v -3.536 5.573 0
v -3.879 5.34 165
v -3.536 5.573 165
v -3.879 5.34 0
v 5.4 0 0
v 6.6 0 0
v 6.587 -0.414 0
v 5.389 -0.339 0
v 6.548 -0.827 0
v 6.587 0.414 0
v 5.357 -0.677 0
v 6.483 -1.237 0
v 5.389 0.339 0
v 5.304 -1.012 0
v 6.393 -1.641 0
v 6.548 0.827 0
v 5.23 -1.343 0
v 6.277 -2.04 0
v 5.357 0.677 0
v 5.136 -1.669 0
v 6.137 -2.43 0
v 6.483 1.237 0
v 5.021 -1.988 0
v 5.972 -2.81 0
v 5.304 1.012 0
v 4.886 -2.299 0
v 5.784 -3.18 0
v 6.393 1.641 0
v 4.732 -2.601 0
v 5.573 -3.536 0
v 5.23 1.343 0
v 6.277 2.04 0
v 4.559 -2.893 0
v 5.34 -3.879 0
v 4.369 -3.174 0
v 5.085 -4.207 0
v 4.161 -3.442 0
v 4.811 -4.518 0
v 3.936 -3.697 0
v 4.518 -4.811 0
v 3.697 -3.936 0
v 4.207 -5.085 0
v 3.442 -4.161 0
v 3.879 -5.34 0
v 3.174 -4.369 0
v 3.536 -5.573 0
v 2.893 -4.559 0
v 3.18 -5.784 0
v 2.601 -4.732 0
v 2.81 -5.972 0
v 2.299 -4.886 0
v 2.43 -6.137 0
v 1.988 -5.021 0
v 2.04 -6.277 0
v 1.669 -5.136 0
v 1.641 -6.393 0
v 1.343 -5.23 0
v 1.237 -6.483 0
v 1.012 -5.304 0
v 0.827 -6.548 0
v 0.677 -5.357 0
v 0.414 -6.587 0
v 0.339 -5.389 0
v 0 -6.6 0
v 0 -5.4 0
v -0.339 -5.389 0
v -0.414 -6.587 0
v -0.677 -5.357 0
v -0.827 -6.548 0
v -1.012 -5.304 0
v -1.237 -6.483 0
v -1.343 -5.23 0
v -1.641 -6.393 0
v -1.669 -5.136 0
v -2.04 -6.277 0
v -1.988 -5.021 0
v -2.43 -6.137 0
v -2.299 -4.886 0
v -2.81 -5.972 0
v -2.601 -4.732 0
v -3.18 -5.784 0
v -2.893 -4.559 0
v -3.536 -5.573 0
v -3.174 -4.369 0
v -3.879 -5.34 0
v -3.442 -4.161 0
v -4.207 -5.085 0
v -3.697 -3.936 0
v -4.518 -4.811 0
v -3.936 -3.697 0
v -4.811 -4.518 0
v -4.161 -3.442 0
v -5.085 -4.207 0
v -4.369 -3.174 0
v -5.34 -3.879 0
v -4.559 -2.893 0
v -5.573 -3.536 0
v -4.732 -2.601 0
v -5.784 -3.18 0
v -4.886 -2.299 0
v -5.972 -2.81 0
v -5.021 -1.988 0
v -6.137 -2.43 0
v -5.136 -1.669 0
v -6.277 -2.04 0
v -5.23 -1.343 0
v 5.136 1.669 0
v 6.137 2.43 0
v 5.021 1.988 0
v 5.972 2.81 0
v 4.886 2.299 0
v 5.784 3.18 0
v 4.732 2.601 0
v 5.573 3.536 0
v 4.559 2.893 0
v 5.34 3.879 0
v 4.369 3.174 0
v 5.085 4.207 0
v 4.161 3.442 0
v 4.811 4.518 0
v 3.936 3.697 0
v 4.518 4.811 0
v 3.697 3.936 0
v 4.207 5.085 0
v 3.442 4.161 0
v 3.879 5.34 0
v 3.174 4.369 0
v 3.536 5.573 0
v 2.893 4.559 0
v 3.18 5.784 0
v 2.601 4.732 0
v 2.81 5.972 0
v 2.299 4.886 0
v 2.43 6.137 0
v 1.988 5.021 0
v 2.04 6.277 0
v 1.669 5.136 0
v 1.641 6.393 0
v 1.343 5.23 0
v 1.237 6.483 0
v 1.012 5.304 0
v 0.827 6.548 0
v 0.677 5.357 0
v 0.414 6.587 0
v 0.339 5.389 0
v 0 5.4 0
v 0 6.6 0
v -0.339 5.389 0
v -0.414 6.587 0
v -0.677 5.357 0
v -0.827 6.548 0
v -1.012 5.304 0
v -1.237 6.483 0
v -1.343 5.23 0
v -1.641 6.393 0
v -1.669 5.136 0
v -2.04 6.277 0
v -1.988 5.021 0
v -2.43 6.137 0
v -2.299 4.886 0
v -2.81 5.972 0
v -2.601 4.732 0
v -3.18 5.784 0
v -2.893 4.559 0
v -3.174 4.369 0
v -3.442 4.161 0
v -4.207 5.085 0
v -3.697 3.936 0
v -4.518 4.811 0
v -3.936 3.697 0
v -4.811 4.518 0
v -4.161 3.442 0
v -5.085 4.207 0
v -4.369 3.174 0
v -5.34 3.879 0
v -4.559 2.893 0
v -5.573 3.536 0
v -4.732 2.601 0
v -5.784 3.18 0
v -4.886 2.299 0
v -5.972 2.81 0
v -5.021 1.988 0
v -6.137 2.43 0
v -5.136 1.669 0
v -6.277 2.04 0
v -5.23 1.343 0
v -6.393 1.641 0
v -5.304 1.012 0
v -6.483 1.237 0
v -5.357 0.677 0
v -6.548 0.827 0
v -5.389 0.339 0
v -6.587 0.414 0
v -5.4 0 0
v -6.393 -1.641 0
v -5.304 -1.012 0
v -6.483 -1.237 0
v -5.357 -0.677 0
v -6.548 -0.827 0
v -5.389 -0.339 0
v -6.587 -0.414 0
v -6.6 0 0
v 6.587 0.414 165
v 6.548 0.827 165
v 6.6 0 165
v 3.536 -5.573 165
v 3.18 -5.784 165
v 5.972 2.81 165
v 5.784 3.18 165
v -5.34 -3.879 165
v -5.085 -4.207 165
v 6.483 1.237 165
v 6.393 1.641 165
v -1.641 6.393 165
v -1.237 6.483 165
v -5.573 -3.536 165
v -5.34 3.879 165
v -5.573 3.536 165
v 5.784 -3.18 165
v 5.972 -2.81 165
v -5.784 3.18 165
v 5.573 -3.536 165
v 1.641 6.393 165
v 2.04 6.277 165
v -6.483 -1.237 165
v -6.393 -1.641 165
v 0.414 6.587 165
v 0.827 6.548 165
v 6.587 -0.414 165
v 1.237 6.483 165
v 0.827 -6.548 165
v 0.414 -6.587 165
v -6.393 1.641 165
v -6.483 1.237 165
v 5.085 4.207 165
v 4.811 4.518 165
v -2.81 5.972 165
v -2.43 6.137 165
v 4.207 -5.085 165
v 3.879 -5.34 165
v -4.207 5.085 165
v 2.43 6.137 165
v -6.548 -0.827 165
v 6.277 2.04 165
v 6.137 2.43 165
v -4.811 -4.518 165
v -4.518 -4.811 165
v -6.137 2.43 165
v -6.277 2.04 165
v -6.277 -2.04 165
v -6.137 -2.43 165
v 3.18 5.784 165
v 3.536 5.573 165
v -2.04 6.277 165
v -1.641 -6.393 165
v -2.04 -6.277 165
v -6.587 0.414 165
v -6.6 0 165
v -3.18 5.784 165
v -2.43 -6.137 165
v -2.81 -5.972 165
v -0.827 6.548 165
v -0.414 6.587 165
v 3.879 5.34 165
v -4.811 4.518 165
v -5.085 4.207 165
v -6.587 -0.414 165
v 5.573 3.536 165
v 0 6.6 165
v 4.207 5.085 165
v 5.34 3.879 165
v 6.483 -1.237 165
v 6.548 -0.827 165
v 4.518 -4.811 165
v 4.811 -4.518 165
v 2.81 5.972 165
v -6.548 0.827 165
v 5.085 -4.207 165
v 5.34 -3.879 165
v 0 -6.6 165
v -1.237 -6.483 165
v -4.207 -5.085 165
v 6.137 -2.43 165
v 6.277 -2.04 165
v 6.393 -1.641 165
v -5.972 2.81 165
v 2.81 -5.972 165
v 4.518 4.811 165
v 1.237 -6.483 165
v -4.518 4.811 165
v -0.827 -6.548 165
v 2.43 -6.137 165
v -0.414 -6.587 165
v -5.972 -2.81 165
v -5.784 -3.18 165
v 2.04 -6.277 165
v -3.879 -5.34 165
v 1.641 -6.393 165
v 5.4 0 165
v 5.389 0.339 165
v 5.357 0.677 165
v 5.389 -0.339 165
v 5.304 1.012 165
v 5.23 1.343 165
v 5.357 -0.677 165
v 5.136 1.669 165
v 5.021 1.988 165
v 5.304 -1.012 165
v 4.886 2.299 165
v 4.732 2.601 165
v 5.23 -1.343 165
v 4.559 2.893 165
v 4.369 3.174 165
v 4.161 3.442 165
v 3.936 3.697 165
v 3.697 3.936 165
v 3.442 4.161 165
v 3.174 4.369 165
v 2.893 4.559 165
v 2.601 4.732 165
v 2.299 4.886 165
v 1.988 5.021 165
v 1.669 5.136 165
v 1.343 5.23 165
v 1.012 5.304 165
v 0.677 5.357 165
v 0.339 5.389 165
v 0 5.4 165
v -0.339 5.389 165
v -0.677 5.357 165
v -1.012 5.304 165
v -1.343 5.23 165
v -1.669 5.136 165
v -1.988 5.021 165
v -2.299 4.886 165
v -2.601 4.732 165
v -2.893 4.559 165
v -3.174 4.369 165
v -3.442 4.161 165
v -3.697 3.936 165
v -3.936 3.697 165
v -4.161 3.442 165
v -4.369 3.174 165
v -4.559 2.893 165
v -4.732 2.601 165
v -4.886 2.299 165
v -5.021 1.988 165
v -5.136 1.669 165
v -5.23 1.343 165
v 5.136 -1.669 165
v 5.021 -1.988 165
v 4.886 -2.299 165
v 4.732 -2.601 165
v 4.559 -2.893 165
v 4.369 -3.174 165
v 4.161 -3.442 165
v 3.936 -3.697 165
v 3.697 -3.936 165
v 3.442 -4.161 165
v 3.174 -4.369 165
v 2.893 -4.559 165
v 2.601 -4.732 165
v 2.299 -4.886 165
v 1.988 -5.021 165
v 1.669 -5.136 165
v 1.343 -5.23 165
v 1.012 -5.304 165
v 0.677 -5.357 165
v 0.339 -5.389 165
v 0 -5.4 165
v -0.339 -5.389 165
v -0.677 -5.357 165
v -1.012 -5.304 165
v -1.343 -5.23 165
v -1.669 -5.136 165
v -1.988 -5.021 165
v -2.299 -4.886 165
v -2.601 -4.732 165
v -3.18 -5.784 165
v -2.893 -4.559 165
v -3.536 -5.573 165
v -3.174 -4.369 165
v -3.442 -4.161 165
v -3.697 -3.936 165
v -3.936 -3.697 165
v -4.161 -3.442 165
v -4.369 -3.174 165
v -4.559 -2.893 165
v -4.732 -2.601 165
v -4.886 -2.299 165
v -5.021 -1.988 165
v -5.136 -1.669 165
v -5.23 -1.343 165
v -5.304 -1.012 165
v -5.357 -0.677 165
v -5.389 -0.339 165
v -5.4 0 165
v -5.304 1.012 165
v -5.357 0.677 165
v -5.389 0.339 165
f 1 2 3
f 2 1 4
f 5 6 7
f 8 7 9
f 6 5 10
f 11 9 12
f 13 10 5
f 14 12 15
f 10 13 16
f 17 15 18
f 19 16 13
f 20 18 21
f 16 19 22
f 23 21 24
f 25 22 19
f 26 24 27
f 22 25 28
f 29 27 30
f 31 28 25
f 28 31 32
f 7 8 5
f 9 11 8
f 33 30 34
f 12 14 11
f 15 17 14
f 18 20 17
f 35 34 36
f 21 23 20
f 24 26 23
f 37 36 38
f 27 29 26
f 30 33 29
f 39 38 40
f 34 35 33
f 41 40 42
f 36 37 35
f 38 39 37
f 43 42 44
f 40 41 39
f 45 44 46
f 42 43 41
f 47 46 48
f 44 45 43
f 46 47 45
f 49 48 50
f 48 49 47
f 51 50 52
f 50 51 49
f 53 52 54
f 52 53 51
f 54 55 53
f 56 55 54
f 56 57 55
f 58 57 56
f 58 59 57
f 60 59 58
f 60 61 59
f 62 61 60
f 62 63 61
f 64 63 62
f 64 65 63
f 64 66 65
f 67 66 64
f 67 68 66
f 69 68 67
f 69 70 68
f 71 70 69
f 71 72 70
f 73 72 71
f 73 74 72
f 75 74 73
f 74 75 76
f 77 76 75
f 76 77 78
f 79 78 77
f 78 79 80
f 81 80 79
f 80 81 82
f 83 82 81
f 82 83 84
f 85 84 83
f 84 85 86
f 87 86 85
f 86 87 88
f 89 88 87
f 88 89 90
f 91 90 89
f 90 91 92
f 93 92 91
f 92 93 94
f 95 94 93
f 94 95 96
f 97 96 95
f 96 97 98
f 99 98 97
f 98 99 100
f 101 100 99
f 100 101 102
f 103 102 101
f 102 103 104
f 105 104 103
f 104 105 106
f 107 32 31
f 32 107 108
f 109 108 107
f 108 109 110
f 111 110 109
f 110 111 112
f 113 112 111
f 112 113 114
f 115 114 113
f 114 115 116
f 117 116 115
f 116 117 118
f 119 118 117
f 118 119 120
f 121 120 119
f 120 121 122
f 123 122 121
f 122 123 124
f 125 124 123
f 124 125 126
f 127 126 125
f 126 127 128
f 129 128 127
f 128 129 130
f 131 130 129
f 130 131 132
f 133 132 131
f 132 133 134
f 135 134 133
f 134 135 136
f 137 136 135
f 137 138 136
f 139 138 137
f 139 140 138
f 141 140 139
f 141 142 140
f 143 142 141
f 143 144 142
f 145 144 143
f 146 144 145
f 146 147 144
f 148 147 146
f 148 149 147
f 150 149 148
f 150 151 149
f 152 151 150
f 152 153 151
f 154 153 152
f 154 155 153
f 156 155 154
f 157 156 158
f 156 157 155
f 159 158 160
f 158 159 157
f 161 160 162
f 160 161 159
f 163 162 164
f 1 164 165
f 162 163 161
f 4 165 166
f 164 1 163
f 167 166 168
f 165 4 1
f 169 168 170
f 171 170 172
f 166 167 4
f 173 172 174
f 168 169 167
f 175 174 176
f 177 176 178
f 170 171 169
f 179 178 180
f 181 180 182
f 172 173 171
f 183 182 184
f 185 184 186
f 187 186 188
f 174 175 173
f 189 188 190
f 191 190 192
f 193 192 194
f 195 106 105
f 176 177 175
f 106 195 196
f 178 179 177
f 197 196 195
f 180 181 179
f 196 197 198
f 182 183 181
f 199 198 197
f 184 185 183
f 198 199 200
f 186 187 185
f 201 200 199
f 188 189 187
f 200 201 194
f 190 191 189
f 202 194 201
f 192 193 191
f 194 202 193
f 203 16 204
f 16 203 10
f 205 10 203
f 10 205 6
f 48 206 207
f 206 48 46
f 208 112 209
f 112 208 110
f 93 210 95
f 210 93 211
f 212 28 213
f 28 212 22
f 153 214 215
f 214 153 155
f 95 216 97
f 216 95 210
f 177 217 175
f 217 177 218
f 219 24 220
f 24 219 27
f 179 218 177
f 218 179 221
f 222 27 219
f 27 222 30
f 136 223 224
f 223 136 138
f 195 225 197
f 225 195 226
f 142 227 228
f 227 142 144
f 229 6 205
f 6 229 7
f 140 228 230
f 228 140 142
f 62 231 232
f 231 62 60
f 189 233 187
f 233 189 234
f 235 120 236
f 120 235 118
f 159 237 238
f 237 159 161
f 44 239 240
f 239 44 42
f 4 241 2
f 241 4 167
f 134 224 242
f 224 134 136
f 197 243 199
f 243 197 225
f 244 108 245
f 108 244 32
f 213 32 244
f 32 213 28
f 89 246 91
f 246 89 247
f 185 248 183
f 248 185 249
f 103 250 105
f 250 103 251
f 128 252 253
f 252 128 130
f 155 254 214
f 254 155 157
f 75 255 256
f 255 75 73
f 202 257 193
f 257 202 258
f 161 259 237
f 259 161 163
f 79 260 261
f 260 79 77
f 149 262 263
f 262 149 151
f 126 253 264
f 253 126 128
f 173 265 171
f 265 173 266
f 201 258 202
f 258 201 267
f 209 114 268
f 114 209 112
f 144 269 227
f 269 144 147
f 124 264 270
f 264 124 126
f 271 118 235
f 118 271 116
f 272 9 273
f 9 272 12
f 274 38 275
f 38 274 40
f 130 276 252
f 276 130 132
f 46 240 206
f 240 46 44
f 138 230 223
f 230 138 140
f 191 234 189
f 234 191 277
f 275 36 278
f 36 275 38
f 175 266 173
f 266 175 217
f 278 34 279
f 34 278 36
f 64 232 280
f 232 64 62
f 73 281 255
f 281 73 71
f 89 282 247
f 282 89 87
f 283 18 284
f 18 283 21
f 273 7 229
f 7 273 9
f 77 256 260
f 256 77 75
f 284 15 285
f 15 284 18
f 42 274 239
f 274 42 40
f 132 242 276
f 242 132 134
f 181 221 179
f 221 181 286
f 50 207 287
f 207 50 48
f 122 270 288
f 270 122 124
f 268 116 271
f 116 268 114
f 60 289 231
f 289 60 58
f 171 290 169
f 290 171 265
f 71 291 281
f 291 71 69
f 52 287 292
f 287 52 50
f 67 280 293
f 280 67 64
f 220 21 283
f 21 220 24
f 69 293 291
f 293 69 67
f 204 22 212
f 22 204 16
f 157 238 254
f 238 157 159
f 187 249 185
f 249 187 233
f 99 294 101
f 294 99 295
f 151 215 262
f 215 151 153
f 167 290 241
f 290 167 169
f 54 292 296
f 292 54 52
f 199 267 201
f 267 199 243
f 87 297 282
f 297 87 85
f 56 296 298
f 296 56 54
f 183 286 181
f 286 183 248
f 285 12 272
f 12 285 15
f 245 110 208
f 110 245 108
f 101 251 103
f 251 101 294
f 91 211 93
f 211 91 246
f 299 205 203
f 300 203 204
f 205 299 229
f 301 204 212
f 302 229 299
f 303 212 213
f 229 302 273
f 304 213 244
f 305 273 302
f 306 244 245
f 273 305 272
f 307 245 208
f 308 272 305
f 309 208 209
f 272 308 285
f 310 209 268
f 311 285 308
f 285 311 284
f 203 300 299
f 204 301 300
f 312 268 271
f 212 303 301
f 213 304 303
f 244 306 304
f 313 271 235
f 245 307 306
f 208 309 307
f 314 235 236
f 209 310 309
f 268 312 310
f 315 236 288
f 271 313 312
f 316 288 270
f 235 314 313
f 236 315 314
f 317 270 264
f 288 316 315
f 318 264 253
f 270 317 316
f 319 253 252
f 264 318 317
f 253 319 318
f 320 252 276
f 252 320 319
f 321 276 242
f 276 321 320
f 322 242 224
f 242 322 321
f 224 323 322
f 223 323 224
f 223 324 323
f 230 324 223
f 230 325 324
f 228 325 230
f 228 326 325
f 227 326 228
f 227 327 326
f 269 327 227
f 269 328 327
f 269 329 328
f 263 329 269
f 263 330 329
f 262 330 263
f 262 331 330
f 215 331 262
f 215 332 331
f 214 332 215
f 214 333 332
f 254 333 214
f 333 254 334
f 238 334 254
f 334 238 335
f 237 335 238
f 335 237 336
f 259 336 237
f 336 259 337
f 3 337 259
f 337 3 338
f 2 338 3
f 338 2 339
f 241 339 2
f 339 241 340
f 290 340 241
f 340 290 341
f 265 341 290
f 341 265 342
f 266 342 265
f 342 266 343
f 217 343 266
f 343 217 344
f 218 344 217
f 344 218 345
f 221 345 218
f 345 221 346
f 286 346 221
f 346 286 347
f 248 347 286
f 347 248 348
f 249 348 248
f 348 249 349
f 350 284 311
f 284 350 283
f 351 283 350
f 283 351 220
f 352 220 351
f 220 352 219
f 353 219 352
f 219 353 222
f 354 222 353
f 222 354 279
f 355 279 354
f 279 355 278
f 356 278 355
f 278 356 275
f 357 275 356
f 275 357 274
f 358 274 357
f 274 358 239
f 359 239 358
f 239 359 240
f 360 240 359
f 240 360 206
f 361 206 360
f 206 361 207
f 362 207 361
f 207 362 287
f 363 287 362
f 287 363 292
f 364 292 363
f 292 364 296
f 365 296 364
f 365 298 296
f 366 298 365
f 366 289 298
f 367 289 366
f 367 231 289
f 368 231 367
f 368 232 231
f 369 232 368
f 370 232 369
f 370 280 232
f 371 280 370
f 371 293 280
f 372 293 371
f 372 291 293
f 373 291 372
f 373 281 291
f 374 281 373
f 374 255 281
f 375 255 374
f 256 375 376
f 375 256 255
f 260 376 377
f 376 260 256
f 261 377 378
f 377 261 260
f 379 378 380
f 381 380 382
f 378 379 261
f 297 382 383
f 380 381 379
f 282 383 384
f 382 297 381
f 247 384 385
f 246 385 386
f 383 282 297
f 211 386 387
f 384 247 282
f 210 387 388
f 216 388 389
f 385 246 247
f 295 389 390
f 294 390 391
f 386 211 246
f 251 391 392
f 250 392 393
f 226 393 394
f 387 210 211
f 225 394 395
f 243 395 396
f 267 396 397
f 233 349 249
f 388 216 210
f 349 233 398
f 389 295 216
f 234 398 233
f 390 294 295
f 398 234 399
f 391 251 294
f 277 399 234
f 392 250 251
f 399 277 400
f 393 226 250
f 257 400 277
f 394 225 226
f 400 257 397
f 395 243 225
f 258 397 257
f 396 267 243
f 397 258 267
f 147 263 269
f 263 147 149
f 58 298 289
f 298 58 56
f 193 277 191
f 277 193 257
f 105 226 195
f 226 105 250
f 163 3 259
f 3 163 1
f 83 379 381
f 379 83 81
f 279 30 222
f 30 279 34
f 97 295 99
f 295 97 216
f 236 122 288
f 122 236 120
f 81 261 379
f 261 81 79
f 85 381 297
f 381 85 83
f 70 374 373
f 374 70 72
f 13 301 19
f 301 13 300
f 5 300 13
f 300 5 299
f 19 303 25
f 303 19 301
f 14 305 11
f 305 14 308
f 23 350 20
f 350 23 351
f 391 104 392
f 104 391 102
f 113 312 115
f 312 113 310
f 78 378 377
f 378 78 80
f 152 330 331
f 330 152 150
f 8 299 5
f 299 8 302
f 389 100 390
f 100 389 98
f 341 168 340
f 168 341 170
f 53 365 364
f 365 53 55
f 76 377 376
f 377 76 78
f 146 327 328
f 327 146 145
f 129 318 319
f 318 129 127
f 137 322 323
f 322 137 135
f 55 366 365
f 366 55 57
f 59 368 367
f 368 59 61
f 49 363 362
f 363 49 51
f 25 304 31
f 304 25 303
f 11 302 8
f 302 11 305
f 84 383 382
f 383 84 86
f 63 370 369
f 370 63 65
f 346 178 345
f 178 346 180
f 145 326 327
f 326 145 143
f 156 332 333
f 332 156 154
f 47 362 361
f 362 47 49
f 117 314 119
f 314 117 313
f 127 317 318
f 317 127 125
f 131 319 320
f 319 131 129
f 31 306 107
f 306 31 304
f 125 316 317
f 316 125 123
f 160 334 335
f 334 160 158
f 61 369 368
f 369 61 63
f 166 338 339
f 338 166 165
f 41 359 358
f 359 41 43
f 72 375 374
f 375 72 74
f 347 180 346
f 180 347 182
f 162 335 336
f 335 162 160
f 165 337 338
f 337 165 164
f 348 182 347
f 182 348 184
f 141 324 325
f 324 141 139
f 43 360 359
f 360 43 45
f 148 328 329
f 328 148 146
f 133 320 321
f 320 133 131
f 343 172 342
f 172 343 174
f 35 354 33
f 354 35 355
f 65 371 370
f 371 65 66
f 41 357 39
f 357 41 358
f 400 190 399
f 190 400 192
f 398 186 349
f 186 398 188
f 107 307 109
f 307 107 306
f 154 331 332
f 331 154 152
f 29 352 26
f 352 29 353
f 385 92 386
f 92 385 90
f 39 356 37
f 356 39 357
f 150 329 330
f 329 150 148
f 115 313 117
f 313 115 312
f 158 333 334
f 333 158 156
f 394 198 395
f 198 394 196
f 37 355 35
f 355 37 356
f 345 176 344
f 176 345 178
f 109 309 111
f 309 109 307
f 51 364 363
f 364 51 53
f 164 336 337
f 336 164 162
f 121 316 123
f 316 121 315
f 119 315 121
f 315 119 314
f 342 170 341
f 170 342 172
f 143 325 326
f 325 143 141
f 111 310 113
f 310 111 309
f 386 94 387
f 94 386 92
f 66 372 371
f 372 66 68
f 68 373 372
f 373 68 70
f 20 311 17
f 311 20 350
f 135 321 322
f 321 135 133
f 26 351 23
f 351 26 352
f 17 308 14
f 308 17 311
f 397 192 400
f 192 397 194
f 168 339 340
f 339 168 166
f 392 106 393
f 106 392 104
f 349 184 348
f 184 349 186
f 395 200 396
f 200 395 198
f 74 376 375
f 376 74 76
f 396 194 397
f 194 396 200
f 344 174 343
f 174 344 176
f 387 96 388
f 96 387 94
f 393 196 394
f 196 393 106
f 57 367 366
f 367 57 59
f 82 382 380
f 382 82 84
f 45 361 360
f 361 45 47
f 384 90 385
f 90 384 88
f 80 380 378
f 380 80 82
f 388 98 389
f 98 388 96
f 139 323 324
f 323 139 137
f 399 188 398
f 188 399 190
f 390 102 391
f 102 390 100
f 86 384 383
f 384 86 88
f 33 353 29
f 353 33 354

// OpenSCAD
inner_diameter = 10.8;
outter_diameter= (1.2*2)+inner_diameter;
height=165;

difference(){
cylinder(r1=outter_diameter/2, r2=outter_diameter/2, h=height, $fn=100);
    translate([0,0,-1])
cylinder(r1=inner_diameter/2, r2=inner_diameter/2, h=height+2, $fn=100);
}
